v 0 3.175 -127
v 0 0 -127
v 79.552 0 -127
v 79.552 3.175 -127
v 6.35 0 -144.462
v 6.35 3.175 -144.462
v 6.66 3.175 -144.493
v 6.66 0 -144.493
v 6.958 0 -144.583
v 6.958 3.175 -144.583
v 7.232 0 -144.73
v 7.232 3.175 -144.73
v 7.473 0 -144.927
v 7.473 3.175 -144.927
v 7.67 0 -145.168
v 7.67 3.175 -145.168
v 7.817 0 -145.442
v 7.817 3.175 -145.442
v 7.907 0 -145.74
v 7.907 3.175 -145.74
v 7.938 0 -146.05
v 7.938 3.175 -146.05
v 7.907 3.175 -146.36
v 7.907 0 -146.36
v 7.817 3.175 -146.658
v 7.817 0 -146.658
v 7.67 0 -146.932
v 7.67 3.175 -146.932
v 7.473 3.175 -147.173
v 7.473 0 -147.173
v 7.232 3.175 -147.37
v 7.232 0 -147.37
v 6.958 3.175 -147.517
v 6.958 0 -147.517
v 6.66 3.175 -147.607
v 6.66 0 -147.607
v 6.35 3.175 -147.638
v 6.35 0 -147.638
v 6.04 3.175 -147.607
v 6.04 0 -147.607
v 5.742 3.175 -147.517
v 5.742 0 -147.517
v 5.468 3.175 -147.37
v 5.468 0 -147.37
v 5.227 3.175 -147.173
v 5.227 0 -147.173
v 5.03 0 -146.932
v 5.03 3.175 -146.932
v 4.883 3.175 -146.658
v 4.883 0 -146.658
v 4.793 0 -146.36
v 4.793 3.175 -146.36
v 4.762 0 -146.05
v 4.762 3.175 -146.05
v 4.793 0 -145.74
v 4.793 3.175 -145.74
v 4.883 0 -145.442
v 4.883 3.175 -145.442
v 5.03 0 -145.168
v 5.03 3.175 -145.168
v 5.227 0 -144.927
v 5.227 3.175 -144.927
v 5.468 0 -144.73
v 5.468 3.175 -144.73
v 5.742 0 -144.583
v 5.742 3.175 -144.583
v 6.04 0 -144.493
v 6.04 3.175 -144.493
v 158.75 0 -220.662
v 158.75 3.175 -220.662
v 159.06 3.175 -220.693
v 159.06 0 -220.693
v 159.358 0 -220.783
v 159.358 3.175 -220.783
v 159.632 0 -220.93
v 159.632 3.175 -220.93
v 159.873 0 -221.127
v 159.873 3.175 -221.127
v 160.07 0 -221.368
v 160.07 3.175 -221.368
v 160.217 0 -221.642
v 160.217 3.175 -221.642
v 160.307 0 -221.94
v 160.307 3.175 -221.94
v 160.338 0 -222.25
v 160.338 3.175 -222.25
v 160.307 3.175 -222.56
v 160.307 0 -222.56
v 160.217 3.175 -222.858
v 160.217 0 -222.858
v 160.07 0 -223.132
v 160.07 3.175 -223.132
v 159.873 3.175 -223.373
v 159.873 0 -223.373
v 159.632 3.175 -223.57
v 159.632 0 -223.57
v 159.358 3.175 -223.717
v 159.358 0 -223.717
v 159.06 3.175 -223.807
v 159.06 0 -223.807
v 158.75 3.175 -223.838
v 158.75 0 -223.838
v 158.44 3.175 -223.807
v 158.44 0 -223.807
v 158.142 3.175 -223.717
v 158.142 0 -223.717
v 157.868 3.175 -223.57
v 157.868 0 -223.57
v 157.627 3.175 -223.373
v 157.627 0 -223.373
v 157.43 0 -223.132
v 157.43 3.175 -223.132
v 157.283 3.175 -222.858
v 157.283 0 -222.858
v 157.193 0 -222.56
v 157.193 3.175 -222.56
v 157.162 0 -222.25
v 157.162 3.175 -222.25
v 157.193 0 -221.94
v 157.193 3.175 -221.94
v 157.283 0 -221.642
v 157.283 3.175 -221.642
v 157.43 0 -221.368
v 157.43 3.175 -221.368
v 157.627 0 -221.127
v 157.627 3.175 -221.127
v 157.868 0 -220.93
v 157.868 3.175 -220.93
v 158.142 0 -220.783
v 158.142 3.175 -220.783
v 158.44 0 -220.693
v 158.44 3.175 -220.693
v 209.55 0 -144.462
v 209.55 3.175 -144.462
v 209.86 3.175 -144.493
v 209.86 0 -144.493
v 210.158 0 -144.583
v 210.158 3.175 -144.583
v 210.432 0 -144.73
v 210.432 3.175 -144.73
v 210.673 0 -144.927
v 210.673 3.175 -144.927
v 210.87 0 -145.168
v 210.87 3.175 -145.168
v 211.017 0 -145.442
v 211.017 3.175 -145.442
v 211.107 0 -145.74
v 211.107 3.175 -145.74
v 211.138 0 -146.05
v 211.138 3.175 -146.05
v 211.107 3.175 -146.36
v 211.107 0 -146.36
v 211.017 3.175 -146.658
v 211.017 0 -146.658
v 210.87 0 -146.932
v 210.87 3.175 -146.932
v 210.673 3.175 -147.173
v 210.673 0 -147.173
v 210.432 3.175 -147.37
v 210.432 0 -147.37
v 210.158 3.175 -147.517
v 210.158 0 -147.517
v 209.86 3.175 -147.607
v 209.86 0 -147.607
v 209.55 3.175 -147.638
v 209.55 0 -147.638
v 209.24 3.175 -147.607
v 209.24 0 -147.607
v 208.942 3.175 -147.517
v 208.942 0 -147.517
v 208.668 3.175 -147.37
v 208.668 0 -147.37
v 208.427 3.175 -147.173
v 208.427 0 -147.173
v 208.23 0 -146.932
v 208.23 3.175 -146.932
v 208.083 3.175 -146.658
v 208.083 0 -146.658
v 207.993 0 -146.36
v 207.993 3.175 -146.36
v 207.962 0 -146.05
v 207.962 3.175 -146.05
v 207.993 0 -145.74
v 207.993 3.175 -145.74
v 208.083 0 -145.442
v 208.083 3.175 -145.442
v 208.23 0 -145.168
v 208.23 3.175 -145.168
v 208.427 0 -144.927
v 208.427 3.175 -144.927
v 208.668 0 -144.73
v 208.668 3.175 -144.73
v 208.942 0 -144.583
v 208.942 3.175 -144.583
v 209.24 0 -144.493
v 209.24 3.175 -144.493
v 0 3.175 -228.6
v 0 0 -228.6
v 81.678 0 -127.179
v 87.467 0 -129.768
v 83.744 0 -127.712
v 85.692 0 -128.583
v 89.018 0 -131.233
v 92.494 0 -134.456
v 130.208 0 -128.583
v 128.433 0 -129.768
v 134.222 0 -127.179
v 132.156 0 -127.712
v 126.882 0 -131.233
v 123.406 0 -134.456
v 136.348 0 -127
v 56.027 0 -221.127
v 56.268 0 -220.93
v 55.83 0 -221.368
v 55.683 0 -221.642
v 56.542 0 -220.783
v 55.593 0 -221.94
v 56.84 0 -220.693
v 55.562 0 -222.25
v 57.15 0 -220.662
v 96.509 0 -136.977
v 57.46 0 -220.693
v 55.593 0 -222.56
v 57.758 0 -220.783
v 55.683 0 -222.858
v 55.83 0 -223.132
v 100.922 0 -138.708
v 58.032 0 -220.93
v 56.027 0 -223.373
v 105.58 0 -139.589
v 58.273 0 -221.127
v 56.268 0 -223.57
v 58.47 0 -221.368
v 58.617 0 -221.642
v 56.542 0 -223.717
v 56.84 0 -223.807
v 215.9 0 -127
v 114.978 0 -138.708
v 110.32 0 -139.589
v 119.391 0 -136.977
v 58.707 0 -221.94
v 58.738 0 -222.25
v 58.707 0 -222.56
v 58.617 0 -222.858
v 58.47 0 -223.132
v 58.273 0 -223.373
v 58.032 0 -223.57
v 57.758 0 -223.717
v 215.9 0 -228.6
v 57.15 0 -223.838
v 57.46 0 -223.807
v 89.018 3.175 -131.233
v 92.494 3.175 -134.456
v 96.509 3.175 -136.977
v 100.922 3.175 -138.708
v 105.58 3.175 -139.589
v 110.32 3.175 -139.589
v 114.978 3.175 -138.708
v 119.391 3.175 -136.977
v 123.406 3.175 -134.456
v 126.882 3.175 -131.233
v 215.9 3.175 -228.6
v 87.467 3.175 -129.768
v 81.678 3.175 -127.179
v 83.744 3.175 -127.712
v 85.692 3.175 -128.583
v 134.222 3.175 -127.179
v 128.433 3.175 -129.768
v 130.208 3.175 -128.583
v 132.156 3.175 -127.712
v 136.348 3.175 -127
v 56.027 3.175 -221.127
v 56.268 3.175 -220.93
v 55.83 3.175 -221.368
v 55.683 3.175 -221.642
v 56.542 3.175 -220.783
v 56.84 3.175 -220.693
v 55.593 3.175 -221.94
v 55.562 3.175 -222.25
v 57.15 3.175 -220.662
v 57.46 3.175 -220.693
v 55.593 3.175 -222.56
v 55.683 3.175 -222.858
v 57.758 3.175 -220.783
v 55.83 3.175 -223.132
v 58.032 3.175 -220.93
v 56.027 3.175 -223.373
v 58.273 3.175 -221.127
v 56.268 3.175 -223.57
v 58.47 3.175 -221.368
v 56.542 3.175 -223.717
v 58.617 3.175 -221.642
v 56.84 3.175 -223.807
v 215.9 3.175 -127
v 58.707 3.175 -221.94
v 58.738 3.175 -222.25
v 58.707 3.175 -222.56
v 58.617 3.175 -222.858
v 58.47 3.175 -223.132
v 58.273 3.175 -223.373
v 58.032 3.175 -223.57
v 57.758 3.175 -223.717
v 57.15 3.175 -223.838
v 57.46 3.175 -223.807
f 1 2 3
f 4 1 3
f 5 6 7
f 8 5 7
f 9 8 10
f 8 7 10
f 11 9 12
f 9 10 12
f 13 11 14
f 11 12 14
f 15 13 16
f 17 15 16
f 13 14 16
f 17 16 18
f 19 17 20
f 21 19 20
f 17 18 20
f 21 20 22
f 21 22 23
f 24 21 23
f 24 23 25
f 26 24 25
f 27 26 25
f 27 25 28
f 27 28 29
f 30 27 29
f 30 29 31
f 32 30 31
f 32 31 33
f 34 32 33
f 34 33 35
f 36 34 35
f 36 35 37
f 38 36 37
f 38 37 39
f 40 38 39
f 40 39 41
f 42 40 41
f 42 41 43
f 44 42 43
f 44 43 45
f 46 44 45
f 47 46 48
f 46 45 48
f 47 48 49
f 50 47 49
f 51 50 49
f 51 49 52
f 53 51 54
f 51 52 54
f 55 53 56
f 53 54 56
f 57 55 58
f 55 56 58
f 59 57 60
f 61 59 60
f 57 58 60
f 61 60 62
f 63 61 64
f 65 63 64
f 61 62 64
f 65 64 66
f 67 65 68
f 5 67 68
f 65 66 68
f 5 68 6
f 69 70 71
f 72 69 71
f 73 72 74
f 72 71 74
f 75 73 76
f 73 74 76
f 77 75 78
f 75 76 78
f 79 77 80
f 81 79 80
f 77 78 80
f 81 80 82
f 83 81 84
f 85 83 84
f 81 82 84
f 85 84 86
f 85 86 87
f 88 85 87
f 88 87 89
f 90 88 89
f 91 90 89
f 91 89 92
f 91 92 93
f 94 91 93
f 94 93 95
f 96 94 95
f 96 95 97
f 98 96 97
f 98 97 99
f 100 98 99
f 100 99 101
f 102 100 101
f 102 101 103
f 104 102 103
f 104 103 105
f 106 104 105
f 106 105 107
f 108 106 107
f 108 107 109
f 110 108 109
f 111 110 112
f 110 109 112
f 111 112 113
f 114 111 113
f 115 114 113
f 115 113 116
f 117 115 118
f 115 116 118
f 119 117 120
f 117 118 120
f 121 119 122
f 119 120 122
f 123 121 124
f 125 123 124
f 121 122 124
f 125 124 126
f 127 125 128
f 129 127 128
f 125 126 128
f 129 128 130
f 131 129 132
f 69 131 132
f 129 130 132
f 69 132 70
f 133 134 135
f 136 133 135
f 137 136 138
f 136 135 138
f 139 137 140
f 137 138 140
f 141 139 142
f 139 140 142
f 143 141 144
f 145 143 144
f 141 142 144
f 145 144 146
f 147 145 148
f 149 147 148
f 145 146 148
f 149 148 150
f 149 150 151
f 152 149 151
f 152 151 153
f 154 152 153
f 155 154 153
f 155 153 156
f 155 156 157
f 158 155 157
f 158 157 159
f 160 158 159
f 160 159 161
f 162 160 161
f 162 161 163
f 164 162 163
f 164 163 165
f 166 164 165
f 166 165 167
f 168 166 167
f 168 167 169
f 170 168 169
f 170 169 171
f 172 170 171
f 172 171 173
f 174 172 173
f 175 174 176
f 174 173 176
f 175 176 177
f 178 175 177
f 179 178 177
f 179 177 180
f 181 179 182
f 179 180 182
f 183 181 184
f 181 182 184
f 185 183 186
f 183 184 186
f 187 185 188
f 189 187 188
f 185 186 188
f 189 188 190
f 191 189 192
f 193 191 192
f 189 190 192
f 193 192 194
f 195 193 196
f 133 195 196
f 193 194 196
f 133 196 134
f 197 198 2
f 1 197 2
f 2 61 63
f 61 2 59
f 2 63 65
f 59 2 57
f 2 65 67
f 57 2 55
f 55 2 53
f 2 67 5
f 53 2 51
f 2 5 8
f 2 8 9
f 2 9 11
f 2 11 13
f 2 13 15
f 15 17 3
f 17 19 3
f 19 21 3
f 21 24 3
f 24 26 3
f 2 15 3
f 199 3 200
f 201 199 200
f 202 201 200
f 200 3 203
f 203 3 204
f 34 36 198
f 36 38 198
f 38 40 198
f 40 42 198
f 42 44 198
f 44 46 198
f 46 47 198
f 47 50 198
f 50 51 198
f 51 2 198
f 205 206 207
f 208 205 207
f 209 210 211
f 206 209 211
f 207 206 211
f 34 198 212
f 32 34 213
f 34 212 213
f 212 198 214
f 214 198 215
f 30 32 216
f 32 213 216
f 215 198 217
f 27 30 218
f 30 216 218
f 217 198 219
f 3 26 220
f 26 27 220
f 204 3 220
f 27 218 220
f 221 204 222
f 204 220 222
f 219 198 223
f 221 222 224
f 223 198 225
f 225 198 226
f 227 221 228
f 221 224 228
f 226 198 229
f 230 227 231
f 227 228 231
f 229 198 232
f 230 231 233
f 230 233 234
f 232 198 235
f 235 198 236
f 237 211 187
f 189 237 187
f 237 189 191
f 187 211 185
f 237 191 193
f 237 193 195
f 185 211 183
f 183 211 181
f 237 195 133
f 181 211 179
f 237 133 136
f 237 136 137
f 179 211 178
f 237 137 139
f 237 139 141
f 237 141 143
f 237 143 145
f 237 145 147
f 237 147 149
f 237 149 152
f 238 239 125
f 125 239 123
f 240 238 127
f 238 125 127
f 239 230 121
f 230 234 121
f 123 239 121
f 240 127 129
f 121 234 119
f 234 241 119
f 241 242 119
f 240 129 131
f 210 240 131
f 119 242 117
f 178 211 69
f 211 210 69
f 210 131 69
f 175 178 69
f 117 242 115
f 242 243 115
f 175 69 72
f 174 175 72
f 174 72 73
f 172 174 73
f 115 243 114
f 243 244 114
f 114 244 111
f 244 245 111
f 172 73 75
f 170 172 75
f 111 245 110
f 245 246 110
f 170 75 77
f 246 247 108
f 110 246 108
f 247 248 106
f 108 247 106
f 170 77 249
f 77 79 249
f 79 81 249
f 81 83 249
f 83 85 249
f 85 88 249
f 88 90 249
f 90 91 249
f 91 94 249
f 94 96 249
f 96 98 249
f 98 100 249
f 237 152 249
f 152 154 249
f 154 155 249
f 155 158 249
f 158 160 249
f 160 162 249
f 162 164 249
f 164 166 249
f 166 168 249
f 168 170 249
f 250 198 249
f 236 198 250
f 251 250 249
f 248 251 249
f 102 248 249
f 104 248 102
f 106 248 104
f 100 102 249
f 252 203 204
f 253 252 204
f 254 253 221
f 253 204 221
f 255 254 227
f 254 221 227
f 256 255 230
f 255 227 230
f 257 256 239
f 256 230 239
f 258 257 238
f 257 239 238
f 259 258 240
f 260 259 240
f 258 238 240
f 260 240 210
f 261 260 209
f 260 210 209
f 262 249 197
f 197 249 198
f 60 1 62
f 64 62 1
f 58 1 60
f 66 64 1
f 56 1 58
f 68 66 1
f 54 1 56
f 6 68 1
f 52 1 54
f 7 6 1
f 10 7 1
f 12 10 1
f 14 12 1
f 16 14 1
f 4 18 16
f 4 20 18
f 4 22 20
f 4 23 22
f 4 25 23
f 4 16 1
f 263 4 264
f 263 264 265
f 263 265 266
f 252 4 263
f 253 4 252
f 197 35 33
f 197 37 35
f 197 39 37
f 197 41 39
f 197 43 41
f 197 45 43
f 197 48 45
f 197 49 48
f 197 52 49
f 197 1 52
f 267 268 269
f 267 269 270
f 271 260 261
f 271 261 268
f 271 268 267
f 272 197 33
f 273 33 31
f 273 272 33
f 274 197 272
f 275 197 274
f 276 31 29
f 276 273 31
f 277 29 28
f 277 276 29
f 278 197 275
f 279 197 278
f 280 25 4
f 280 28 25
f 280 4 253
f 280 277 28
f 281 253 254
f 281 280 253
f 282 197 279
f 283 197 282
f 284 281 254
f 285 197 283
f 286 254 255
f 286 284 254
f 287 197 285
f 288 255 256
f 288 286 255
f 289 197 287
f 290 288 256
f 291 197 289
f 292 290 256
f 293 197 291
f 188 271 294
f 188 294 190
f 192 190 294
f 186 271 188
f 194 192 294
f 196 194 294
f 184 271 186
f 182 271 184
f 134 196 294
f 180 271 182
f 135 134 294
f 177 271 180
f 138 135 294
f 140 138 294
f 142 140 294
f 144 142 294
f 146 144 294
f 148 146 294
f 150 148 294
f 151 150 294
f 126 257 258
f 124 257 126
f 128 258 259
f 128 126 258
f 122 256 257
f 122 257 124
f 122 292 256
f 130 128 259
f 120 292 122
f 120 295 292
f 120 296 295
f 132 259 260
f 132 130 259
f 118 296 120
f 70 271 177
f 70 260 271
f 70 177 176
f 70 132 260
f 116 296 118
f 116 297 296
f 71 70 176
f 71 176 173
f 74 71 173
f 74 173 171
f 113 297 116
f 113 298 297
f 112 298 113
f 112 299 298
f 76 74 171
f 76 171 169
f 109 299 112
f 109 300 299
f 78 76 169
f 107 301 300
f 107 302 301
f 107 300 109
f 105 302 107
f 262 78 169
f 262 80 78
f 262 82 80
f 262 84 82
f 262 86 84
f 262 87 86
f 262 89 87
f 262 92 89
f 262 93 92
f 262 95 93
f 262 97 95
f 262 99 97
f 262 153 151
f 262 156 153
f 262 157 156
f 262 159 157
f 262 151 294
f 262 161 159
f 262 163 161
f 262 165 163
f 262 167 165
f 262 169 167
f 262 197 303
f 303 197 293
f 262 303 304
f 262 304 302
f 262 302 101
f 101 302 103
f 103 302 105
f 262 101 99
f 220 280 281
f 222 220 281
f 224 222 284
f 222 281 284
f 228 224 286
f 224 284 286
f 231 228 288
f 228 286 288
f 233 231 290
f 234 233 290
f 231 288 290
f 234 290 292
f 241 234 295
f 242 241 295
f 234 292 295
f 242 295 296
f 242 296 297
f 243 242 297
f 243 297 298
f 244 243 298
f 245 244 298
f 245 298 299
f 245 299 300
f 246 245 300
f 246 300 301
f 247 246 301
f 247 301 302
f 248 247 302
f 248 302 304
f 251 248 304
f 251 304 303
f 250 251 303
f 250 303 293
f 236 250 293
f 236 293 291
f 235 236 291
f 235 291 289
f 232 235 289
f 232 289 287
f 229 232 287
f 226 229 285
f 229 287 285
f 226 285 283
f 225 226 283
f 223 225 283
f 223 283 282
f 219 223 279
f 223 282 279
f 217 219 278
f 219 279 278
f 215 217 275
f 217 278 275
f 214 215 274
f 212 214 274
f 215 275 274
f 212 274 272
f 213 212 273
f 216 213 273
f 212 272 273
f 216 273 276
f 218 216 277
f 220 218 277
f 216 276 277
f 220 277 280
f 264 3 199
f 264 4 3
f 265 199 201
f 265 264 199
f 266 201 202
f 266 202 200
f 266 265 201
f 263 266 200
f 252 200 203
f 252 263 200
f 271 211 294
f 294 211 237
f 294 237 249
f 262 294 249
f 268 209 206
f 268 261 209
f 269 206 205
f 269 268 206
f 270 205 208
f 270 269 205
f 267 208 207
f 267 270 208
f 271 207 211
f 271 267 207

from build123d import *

# Parameters (mm, degrees)
BOSS_EXTRUDE1_DEPTH = 3.175
FILLET1_R           = 12.7
SKETCH2_R           = 1.5875
CUT_EXTRUDE1_DEPTH  = 315.453256661


with BuildPart() as part:
    # Sketch1 → Boss-Extrude1 (new body)
    with BuildSketch(Plane(origin=(0, 0, 0), x_dir=(1, 0, 0), z_dir=(0, 1, 0))):
        with BuildLine():
            Line((0, 228.6), (0, 127))
            Line((0, 127), (85.952954744, 127))
            ThreePointArc((85.952954744, 127), (107.95, 139.7), (129.947045256, 127))
            Line((129.947045256, 127), (215.9, 127))
            Line((215.9, 127), (215.9, 228.6))
            Line((215.9, 228.6), (0, 228.6))
        make_face()
    extrude(amount=BOSS_EXTRUDE1_DEPTH)

    # Fillet1
    fillet1_edges = [part.edges().sort_by_distance(p)[0] for p in [
        (85.952954744, 1.5875, -127),
        (129.947045256, 1.5875, -127),
    ]]
    fillet(fillet1_edges, radius=FILLET1_R)

    # Sketch2 → Cut-Extrude1 (cut, through all)
    with BuildSketch(Plane(origin=(0, 3.175, 0), x_dir=(1, 0, 0), z_dir=(0, 1, 0))):
        with Locations(Location((6.35, 146.05, 0), (0, 0, 270))):
            Circle(SKETCH2_R)
        with Locations(Location((57.15, 222.25, 0), (0, 0, 270))):
            Circle(SKETCH2_R)
        with Locations(Location((158.75, 222.25, 0), (0, 0, 270))):
            Circle(SKETCH2_R)
        with Locations(Location((209.55, 146.05, 0), (0, 0, 270))):
            Circle(SKETCH2_R)
    extrude(amount=-CUT_EXTRUDE1_DEPTH, mode=Mode.SUBTRACT)


solid = part.part
